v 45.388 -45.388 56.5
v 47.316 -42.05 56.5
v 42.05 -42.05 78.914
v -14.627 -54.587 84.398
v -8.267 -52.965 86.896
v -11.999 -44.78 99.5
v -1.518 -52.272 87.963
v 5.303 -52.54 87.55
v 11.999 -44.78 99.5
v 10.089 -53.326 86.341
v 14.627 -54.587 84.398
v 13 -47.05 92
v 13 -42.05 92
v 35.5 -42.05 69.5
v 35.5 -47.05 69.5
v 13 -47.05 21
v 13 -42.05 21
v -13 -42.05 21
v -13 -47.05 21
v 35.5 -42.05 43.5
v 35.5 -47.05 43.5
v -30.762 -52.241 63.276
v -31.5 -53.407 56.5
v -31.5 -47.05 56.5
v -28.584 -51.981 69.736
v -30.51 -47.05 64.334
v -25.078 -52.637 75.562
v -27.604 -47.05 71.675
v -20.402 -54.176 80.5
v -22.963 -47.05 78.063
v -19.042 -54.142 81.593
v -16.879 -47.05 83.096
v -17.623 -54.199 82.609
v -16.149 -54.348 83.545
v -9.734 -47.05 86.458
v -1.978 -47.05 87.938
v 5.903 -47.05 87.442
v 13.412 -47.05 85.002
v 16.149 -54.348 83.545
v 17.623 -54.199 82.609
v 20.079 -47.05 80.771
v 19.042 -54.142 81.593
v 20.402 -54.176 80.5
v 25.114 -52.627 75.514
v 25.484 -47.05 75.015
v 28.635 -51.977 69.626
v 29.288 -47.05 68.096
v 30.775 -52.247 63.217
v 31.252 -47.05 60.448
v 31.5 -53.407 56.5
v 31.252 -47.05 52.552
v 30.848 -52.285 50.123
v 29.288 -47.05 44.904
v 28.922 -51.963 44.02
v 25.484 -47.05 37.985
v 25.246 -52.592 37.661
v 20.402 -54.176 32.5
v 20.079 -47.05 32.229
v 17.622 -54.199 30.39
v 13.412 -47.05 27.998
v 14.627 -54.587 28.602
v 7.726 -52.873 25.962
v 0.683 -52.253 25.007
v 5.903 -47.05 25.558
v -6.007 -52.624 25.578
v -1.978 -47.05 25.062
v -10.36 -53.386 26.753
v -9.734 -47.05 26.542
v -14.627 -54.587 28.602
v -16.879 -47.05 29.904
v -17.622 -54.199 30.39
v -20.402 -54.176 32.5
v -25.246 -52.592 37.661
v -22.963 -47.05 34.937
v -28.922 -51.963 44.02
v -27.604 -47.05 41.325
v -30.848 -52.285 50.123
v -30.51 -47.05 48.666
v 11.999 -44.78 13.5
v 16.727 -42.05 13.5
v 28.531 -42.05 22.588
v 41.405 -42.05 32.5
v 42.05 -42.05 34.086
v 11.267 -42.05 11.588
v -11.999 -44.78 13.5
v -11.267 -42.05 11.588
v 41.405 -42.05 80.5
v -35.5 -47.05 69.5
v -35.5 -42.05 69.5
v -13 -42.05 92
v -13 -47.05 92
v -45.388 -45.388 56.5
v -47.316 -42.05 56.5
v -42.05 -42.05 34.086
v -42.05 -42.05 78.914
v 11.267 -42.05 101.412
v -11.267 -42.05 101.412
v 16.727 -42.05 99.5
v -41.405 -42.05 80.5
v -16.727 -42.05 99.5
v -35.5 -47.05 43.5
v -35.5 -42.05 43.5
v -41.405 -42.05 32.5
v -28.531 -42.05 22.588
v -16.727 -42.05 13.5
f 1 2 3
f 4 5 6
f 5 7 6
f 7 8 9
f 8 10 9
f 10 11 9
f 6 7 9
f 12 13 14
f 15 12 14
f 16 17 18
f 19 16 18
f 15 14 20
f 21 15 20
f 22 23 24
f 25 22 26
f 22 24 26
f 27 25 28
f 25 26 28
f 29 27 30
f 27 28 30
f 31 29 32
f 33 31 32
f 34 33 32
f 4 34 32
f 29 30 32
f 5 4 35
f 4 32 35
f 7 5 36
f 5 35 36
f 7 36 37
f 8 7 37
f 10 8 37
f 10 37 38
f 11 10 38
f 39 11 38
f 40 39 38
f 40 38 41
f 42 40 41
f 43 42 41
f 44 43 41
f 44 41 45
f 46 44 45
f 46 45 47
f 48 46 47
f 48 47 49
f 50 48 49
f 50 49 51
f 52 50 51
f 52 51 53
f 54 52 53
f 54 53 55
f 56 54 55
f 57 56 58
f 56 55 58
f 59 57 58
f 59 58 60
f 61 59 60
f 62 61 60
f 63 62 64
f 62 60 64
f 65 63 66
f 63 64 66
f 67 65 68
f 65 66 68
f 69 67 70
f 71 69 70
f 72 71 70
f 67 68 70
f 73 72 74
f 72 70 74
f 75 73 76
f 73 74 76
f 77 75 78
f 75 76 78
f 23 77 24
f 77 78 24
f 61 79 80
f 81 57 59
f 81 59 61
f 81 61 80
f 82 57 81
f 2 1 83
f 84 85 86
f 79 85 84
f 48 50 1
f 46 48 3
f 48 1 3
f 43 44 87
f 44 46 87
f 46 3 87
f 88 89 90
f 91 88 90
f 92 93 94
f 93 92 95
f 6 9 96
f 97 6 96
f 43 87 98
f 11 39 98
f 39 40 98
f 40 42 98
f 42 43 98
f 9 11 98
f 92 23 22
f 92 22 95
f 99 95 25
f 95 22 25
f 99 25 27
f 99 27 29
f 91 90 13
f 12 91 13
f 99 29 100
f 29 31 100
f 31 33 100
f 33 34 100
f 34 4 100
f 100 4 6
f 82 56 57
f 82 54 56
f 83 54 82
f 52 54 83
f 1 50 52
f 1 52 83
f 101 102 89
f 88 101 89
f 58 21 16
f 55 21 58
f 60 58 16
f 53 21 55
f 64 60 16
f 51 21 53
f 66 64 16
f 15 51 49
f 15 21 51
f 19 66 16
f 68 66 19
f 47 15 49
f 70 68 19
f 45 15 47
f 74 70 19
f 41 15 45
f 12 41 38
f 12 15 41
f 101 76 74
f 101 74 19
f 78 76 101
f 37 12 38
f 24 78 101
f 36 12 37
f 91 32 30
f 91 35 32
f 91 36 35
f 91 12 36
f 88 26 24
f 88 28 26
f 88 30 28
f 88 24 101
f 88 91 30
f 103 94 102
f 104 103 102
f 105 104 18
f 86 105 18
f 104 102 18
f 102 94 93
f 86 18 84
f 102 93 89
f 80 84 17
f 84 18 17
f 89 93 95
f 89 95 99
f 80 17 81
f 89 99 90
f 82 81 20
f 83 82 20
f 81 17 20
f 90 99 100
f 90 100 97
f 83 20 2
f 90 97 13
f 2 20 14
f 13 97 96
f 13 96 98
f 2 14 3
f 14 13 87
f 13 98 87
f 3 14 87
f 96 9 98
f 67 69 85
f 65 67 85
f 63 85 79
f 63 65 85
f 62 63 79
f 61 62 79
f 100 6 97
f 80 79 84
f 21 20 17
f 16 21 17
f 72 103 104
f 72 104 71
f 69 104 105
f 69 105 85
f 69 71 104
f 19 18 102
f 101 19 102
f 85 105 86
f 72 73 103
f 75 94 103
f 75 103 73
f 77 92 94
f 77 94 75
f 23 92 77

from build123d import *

# Parameters (mm, degrees)
F2_DEPTH  = 13.5
F2_TAPER  = -55
F4_DEPTH  = 19
F4_TAPER  = -33
F6_DEPTH  = 24
F6_TAPER  = -11.5
F8_DEPTH  = 24
F8_TAPER  = 11.5
F10_DEPTH = 19
F10_TAPER = 33
F12_DEPTH = 13.5
F12_TAPER = 55
F17_COUNT = 12
F17_ANGLE = 330
F19_W     = 150.1999571919
F19_H     = 155.7629220188
F20_DEPTH = 104.0525976479
F21_R     = 31.5
F22_DEPTH = 25
F23_R     = 31.5
F24_DEPTH = 5


with BuildPart() as f2:
    # F1 (on Top) → F2 (new body)
    with BuildSketch(Plane.XY):
        Polygon((18.667295593, -18.667295593), (25.5, -6.832704407), (25.5, 6.832704407), (18.667295593, 18.667295593), (6.832704407, 25.5), (-6.832704407, 25.5), (-18.667295593, 18.667295593), (-25.5, 6.832704407), (-25.5, -6.832704407), (-18.667295593, -18.667295593), (-6.832704407, -25.5), (6.832704407, -25.5), align=None)
    extrude(amount=F2_DEPTH, taper=F2_TAPER)

    # F3 (on face) → F4 (join)
    with BuildSketch(Plane.XY.offset(13.5)):
        Polygon((11.9987643256, -44.779998091), (32.7812337655, -32.7812337655), (44.779998091, -11.9987643256), (44.779998091, 11.9987643256), (32.7812337655, 32.7812337655), (11.9987643256, 44.779998091), (-11.9987643256, 44.779998091), (-32.7812337655, 32.7812337655), (-44.779998091, 11.9987643256), (-44.779998091, -11.9987643256), (-32.7812337655, -32.7812337655), (-11.9987643256, -44.779998091), align=None)
    extrude(amount=F4_DEPTH, taper=F4_TAPER)

    # F5 (on face) → F6 (join)
    with BuildSketch(Plane.XY.offset(32.5)):
        Polygon((15.3049208885, -57.1187423618), (41.8138214733, -41.8138214733), (57.1187423618, -15.3049208885), (57.1187423618, 15.3049208885), (41.8138214733, 41.8138214733), (15.3049208885, 57.1187423618), (-15.3049208885, 57.1187423618), (-41.8138214733, 41.8138214733), (-57.1187423618, 15.3049208885), (-57.1187423618, -15.3049208885), (-41.8138214733, -41.8138214733), (-15.3049208885, -57.1187423618), align=None)
    extrude(amount=F6_DEPTH, taper=F6_TAPER)

    # F7 (on face) → F8 (join)
    with BuildSketch(Plane.XY.offset(56.5)):
        Polygon((-16.6132779924, -62.0015975479), (16.6132779924, -62.0015975479), (45.3883195555, -45.3883195555), (62.0015975479, -16.6132779924), (62.0015975479, 16.6132779924), (45.3883195555, 45.3883195555), (16.6132779924, 62.0015975479), (-16.6132779924, 62.0015975479), (-45.3883195555, 45.3883195555), (-62.0015975479, 16.6132779924), (-62.0015975479, -16.6132779924), (-45.3883195555, -45.3883195555), align=None)
    extrude(amount=F8_DEPTH, taper=F8_TAPER)

    # F9 (on face) → F10 (join)
    with BuildSketch(Plane.XY.offset(80.5)):
        Polygon((15.3049208885, -57.1187423618), (41.8138214733, -41.8138214733), (57.1187423618, -15.3049208885), (57.1187423618, 15.3049208885), (41.8138214733, 41.8138214733), (15.3049208885, 57.1187423618), (-15.3049208885, 57.1187423618), (-41.8138214733, 41.8138214733), (-57.1187423618, 15.3049208885), (-57.1187423618, -15.3049208885), (-41.8138214733, -41.8138214733), (-15.3049208885, -57.1187423618), align=None)
    extrude(amount=F10_DEPTH, taper=F10_TAPER)

    # F11 (on face) → F12 (join)
    with BuildSketch(Plane.XY.offset(99.5)):
        Polygon((-32.7812337655, -32.7812337655), (-11.9987643256, -44.779998091), (11.9987643256, -44.779998091), (32.7812337655, -32.7812337655), (44.779998091, -11.9987643256), (44.779998091, 11.9987643256), (32.7812337655, 32.7812337655), (11.9987643256, 44.779998091), (-11.9987643256, 44.779998091), (-32.7812337655, 32.7812337655), (-44.779998091, 11.9987643256), (-44.779998091, -11.9987643256), align=None)
    extrude(amount=F12_DEPTH, taper=F12_TAPER)


with BuildPart() as f16:
    # F15 (on 3pt) → F16 (new body, up to the next surface of F2)
    with BuildSketch(Plane(origin=(12.3175443523, -21.3346126427, 113.1882453996), x_dir=(0.9943304543, 0.0196958746, -0.1044941158), z_dir=(-0.1063341323, 0.1841761198, -0.9771244594))):
        Polygon((6.3859567143, -2.5862935324), (-5.5161138048, 4.1281770657), (-12.3877774228, -21.9585741432), align=None)
    extrude(until=Until.NEXT, target=f2.part)


with BuildPart() as f17_1:
    # F17: instance of F16
    add(f16.part.rotate(Axis((0, 0, 87.5846954226), (0, 0, 1)), 1 * F17_ANGLE / (F17_COUNT - 1)))


with BuildPart() as f17_2:
    # F17: instance of F16
    add(f16.part.rotate(Axis((0, 0, 87.5846954226), (0, 0, 1)), 2 * F17_ANGLE / (F17_COUNT - 1)))


with BuildPart() as f17_3:
    # F17: instance of F16
    add(f16.part.rotate(Axis((0, 0, 87.5846954226), (0, 0, 1)), 3 * F17_ANGLE / (F17_COUNT - 1)))


with BuildPart() as f17_4:
    # F17: instance of F16
    add(f16.part.rotate(Axis((0, 0, 87.5846954226), (0, 0, 1)), 4 * F17_ANGLE / (F17_COUNT - 1)))


with BuildPart() as f17_5:
    # F17: instance of F16
    add(f16.part.rotate(Axis((0, 0, 87.5846954226), (0, 0, 1)), 5 * F17_ANGLE / (F17_COUNT - 1)))


with BuildPart() as f17_6:
    # F17: instance of F16
    add(f16.part.rotate(Axis((0, 0, 87.5846954226), (0, 0, 1)), 6 * F17_ANGLE / (F17_COUNT - 1)))


with BuildPart() as f17_7:
    # F17: instance of F16
    add(f16.part.rotate(Axis((0, 0, 87.5846954226), (0, 0, 1)), 7 * F17_ANGLE / (F17_COUNT - 1)))


with BuildPart() as f17_8:
    # F17: instance of F16
    add(f16.part.rotate(Axis((0, 0, 87.5846954226), (0, 0, 1)), 8 * F17_ANGLE / (F17_COUNT - 1)))


with BuildPart() as f17_9:
    # F17: instance of F16
    add(f16.part.rotate(Axis((0, 0, 87.5846954226), (0, 0, 1)), 9 * F17_ANGLE / (F17_COUNT - 1)))


with BuildPart() as f17_10:
    # F17: instance of F16
    add(f16.part.rotate(Axis((0, 0, 87.5846954226), (0, 0, 1)), 10 * F17_ANGLE / (F17_COUNT - 1)))


with BuildPart() as f17_11:
    # F17: instance of F16
    add(f16.part.rotate(Axis((0, 0, 87.5846954226), (0, 0, 1)), 11 * F17_ANGLE / (F17_COUNT - 1)))


with BuildPart() as f20_tool:
    # F19 (on offset) → F20 (new body, through all)
    with BuildSketch(Plane.XZ.offset(42.05)):
        with Locations((3.019284457, 52.1549973637)):
            Rectangle(F19_W, F19_H)
    extrude(amount=-F20_DEPTH)


with BuildPart() as f2_1:
    add(f2.part)

    # F20: cut by f20_tool
    add(f20_tool.part, mode=Mode.SUBTRACT)

    # F21 (on face) → F22 (cut)
    with BuildSketch(Plane(origin=(0, -42.05, 0), x_dir=(-1, 0, 0), z_dir=(0, 1, 0))):
        with Locations((0, 56.5)):
            Circle(F21_R)
    extrude(amount=-F22_DEPTH, mode=Mode.SUBTRACT)

    # F23 (on face) → F24 (cut)
    with BuildSketch(Plane(origin=(0, -42.05, 0), x_dir=(-1, 0, 0), z_dir=(0, 1, 0))):
        Polygon((13, 92), (-13, 92), (-35.5, 69.5), (-35.5, 43.5), (-13, 21), (13, 21), (35.5, 43.5), (35.5, 56.5), (35.5, 69.5), align=None)
        with Locations((0, 56.5)):
            Circle(F23_R, mode=Mode.SUBTRACT)
    extrude(amount=-F24_DEPTH, mode=Mode.SUBTRACT)


with BuildPart() as f16_1:
    add(f16.part)

    # F20: cut by f20_tool
    add(f20_tool.part, mode=Mode.SUBTRACT)


with BuildPart() as f17_1_1:
    add(f17_1.part)

    # F20: cut by f20_tool
    add(f20_tool.part, mode=Mode.SUBTRACT)


with BuildPart() as f17_2_1:
    add(f17_2.part)

    # F20: cut by f20_tool
    add(f20_tool.part, mode=Mode.SUBTRACT)


with BuildPart() as f17_3_1:
    add(f17_3.part)

    # F20: cut by f20_tool
    add(f20_tool.part, mode=Mode.SUBTRACT)


with BuildPart() as f17_4_1:
    add(f17_4.part)

    # F20: cut by f20_tool
    add(f20_tool.part, mode=Mode.SUBTRACT)


with BuildPart() as f17_5_1:
    add(f17_5.part)

    # F20: cut by f20_tool
    add(f20_tool.part, mode=Mode.SUBTRACT)


with BuildPart() as f17_6_1:
    add(f17_6.part)

    # F20: cut by f20_tool
    add(f20_tool.part, mode=Mode.SUBTRACT)


with BuildPart() as f17_7_1:
    add(f17_7.part)

    # F20: cut by f20_tool
    add(f20_tool.part, mode=Mode.SUBTRACT)


with BuildPart() as f17_8_1:
    add(f17_8.part)

    # F20: cut by f20_tool
    add(f20_tool.part, mode=Mode.SUBTRACT)


with BuildPart() as f17_9_1:
    add(f17_9.part)

    # F20: cut by f20_tool
    add(f20_tool.part, mode=Mode.SUBTRACT)


with BuildPart() as f17_10_1:
    add(f17_10.part)

    # F20: cut by f20_tool
    add(f20_tool.part, mode=Mode.SUBTRACT)


with BuildPart() as f17_11_1:
    add(f17_11.part)

    # F20: cut by f20_tool
    add(f20_tool.part, mode=Mode.SUBTRACT)


solid = f2_1.part
